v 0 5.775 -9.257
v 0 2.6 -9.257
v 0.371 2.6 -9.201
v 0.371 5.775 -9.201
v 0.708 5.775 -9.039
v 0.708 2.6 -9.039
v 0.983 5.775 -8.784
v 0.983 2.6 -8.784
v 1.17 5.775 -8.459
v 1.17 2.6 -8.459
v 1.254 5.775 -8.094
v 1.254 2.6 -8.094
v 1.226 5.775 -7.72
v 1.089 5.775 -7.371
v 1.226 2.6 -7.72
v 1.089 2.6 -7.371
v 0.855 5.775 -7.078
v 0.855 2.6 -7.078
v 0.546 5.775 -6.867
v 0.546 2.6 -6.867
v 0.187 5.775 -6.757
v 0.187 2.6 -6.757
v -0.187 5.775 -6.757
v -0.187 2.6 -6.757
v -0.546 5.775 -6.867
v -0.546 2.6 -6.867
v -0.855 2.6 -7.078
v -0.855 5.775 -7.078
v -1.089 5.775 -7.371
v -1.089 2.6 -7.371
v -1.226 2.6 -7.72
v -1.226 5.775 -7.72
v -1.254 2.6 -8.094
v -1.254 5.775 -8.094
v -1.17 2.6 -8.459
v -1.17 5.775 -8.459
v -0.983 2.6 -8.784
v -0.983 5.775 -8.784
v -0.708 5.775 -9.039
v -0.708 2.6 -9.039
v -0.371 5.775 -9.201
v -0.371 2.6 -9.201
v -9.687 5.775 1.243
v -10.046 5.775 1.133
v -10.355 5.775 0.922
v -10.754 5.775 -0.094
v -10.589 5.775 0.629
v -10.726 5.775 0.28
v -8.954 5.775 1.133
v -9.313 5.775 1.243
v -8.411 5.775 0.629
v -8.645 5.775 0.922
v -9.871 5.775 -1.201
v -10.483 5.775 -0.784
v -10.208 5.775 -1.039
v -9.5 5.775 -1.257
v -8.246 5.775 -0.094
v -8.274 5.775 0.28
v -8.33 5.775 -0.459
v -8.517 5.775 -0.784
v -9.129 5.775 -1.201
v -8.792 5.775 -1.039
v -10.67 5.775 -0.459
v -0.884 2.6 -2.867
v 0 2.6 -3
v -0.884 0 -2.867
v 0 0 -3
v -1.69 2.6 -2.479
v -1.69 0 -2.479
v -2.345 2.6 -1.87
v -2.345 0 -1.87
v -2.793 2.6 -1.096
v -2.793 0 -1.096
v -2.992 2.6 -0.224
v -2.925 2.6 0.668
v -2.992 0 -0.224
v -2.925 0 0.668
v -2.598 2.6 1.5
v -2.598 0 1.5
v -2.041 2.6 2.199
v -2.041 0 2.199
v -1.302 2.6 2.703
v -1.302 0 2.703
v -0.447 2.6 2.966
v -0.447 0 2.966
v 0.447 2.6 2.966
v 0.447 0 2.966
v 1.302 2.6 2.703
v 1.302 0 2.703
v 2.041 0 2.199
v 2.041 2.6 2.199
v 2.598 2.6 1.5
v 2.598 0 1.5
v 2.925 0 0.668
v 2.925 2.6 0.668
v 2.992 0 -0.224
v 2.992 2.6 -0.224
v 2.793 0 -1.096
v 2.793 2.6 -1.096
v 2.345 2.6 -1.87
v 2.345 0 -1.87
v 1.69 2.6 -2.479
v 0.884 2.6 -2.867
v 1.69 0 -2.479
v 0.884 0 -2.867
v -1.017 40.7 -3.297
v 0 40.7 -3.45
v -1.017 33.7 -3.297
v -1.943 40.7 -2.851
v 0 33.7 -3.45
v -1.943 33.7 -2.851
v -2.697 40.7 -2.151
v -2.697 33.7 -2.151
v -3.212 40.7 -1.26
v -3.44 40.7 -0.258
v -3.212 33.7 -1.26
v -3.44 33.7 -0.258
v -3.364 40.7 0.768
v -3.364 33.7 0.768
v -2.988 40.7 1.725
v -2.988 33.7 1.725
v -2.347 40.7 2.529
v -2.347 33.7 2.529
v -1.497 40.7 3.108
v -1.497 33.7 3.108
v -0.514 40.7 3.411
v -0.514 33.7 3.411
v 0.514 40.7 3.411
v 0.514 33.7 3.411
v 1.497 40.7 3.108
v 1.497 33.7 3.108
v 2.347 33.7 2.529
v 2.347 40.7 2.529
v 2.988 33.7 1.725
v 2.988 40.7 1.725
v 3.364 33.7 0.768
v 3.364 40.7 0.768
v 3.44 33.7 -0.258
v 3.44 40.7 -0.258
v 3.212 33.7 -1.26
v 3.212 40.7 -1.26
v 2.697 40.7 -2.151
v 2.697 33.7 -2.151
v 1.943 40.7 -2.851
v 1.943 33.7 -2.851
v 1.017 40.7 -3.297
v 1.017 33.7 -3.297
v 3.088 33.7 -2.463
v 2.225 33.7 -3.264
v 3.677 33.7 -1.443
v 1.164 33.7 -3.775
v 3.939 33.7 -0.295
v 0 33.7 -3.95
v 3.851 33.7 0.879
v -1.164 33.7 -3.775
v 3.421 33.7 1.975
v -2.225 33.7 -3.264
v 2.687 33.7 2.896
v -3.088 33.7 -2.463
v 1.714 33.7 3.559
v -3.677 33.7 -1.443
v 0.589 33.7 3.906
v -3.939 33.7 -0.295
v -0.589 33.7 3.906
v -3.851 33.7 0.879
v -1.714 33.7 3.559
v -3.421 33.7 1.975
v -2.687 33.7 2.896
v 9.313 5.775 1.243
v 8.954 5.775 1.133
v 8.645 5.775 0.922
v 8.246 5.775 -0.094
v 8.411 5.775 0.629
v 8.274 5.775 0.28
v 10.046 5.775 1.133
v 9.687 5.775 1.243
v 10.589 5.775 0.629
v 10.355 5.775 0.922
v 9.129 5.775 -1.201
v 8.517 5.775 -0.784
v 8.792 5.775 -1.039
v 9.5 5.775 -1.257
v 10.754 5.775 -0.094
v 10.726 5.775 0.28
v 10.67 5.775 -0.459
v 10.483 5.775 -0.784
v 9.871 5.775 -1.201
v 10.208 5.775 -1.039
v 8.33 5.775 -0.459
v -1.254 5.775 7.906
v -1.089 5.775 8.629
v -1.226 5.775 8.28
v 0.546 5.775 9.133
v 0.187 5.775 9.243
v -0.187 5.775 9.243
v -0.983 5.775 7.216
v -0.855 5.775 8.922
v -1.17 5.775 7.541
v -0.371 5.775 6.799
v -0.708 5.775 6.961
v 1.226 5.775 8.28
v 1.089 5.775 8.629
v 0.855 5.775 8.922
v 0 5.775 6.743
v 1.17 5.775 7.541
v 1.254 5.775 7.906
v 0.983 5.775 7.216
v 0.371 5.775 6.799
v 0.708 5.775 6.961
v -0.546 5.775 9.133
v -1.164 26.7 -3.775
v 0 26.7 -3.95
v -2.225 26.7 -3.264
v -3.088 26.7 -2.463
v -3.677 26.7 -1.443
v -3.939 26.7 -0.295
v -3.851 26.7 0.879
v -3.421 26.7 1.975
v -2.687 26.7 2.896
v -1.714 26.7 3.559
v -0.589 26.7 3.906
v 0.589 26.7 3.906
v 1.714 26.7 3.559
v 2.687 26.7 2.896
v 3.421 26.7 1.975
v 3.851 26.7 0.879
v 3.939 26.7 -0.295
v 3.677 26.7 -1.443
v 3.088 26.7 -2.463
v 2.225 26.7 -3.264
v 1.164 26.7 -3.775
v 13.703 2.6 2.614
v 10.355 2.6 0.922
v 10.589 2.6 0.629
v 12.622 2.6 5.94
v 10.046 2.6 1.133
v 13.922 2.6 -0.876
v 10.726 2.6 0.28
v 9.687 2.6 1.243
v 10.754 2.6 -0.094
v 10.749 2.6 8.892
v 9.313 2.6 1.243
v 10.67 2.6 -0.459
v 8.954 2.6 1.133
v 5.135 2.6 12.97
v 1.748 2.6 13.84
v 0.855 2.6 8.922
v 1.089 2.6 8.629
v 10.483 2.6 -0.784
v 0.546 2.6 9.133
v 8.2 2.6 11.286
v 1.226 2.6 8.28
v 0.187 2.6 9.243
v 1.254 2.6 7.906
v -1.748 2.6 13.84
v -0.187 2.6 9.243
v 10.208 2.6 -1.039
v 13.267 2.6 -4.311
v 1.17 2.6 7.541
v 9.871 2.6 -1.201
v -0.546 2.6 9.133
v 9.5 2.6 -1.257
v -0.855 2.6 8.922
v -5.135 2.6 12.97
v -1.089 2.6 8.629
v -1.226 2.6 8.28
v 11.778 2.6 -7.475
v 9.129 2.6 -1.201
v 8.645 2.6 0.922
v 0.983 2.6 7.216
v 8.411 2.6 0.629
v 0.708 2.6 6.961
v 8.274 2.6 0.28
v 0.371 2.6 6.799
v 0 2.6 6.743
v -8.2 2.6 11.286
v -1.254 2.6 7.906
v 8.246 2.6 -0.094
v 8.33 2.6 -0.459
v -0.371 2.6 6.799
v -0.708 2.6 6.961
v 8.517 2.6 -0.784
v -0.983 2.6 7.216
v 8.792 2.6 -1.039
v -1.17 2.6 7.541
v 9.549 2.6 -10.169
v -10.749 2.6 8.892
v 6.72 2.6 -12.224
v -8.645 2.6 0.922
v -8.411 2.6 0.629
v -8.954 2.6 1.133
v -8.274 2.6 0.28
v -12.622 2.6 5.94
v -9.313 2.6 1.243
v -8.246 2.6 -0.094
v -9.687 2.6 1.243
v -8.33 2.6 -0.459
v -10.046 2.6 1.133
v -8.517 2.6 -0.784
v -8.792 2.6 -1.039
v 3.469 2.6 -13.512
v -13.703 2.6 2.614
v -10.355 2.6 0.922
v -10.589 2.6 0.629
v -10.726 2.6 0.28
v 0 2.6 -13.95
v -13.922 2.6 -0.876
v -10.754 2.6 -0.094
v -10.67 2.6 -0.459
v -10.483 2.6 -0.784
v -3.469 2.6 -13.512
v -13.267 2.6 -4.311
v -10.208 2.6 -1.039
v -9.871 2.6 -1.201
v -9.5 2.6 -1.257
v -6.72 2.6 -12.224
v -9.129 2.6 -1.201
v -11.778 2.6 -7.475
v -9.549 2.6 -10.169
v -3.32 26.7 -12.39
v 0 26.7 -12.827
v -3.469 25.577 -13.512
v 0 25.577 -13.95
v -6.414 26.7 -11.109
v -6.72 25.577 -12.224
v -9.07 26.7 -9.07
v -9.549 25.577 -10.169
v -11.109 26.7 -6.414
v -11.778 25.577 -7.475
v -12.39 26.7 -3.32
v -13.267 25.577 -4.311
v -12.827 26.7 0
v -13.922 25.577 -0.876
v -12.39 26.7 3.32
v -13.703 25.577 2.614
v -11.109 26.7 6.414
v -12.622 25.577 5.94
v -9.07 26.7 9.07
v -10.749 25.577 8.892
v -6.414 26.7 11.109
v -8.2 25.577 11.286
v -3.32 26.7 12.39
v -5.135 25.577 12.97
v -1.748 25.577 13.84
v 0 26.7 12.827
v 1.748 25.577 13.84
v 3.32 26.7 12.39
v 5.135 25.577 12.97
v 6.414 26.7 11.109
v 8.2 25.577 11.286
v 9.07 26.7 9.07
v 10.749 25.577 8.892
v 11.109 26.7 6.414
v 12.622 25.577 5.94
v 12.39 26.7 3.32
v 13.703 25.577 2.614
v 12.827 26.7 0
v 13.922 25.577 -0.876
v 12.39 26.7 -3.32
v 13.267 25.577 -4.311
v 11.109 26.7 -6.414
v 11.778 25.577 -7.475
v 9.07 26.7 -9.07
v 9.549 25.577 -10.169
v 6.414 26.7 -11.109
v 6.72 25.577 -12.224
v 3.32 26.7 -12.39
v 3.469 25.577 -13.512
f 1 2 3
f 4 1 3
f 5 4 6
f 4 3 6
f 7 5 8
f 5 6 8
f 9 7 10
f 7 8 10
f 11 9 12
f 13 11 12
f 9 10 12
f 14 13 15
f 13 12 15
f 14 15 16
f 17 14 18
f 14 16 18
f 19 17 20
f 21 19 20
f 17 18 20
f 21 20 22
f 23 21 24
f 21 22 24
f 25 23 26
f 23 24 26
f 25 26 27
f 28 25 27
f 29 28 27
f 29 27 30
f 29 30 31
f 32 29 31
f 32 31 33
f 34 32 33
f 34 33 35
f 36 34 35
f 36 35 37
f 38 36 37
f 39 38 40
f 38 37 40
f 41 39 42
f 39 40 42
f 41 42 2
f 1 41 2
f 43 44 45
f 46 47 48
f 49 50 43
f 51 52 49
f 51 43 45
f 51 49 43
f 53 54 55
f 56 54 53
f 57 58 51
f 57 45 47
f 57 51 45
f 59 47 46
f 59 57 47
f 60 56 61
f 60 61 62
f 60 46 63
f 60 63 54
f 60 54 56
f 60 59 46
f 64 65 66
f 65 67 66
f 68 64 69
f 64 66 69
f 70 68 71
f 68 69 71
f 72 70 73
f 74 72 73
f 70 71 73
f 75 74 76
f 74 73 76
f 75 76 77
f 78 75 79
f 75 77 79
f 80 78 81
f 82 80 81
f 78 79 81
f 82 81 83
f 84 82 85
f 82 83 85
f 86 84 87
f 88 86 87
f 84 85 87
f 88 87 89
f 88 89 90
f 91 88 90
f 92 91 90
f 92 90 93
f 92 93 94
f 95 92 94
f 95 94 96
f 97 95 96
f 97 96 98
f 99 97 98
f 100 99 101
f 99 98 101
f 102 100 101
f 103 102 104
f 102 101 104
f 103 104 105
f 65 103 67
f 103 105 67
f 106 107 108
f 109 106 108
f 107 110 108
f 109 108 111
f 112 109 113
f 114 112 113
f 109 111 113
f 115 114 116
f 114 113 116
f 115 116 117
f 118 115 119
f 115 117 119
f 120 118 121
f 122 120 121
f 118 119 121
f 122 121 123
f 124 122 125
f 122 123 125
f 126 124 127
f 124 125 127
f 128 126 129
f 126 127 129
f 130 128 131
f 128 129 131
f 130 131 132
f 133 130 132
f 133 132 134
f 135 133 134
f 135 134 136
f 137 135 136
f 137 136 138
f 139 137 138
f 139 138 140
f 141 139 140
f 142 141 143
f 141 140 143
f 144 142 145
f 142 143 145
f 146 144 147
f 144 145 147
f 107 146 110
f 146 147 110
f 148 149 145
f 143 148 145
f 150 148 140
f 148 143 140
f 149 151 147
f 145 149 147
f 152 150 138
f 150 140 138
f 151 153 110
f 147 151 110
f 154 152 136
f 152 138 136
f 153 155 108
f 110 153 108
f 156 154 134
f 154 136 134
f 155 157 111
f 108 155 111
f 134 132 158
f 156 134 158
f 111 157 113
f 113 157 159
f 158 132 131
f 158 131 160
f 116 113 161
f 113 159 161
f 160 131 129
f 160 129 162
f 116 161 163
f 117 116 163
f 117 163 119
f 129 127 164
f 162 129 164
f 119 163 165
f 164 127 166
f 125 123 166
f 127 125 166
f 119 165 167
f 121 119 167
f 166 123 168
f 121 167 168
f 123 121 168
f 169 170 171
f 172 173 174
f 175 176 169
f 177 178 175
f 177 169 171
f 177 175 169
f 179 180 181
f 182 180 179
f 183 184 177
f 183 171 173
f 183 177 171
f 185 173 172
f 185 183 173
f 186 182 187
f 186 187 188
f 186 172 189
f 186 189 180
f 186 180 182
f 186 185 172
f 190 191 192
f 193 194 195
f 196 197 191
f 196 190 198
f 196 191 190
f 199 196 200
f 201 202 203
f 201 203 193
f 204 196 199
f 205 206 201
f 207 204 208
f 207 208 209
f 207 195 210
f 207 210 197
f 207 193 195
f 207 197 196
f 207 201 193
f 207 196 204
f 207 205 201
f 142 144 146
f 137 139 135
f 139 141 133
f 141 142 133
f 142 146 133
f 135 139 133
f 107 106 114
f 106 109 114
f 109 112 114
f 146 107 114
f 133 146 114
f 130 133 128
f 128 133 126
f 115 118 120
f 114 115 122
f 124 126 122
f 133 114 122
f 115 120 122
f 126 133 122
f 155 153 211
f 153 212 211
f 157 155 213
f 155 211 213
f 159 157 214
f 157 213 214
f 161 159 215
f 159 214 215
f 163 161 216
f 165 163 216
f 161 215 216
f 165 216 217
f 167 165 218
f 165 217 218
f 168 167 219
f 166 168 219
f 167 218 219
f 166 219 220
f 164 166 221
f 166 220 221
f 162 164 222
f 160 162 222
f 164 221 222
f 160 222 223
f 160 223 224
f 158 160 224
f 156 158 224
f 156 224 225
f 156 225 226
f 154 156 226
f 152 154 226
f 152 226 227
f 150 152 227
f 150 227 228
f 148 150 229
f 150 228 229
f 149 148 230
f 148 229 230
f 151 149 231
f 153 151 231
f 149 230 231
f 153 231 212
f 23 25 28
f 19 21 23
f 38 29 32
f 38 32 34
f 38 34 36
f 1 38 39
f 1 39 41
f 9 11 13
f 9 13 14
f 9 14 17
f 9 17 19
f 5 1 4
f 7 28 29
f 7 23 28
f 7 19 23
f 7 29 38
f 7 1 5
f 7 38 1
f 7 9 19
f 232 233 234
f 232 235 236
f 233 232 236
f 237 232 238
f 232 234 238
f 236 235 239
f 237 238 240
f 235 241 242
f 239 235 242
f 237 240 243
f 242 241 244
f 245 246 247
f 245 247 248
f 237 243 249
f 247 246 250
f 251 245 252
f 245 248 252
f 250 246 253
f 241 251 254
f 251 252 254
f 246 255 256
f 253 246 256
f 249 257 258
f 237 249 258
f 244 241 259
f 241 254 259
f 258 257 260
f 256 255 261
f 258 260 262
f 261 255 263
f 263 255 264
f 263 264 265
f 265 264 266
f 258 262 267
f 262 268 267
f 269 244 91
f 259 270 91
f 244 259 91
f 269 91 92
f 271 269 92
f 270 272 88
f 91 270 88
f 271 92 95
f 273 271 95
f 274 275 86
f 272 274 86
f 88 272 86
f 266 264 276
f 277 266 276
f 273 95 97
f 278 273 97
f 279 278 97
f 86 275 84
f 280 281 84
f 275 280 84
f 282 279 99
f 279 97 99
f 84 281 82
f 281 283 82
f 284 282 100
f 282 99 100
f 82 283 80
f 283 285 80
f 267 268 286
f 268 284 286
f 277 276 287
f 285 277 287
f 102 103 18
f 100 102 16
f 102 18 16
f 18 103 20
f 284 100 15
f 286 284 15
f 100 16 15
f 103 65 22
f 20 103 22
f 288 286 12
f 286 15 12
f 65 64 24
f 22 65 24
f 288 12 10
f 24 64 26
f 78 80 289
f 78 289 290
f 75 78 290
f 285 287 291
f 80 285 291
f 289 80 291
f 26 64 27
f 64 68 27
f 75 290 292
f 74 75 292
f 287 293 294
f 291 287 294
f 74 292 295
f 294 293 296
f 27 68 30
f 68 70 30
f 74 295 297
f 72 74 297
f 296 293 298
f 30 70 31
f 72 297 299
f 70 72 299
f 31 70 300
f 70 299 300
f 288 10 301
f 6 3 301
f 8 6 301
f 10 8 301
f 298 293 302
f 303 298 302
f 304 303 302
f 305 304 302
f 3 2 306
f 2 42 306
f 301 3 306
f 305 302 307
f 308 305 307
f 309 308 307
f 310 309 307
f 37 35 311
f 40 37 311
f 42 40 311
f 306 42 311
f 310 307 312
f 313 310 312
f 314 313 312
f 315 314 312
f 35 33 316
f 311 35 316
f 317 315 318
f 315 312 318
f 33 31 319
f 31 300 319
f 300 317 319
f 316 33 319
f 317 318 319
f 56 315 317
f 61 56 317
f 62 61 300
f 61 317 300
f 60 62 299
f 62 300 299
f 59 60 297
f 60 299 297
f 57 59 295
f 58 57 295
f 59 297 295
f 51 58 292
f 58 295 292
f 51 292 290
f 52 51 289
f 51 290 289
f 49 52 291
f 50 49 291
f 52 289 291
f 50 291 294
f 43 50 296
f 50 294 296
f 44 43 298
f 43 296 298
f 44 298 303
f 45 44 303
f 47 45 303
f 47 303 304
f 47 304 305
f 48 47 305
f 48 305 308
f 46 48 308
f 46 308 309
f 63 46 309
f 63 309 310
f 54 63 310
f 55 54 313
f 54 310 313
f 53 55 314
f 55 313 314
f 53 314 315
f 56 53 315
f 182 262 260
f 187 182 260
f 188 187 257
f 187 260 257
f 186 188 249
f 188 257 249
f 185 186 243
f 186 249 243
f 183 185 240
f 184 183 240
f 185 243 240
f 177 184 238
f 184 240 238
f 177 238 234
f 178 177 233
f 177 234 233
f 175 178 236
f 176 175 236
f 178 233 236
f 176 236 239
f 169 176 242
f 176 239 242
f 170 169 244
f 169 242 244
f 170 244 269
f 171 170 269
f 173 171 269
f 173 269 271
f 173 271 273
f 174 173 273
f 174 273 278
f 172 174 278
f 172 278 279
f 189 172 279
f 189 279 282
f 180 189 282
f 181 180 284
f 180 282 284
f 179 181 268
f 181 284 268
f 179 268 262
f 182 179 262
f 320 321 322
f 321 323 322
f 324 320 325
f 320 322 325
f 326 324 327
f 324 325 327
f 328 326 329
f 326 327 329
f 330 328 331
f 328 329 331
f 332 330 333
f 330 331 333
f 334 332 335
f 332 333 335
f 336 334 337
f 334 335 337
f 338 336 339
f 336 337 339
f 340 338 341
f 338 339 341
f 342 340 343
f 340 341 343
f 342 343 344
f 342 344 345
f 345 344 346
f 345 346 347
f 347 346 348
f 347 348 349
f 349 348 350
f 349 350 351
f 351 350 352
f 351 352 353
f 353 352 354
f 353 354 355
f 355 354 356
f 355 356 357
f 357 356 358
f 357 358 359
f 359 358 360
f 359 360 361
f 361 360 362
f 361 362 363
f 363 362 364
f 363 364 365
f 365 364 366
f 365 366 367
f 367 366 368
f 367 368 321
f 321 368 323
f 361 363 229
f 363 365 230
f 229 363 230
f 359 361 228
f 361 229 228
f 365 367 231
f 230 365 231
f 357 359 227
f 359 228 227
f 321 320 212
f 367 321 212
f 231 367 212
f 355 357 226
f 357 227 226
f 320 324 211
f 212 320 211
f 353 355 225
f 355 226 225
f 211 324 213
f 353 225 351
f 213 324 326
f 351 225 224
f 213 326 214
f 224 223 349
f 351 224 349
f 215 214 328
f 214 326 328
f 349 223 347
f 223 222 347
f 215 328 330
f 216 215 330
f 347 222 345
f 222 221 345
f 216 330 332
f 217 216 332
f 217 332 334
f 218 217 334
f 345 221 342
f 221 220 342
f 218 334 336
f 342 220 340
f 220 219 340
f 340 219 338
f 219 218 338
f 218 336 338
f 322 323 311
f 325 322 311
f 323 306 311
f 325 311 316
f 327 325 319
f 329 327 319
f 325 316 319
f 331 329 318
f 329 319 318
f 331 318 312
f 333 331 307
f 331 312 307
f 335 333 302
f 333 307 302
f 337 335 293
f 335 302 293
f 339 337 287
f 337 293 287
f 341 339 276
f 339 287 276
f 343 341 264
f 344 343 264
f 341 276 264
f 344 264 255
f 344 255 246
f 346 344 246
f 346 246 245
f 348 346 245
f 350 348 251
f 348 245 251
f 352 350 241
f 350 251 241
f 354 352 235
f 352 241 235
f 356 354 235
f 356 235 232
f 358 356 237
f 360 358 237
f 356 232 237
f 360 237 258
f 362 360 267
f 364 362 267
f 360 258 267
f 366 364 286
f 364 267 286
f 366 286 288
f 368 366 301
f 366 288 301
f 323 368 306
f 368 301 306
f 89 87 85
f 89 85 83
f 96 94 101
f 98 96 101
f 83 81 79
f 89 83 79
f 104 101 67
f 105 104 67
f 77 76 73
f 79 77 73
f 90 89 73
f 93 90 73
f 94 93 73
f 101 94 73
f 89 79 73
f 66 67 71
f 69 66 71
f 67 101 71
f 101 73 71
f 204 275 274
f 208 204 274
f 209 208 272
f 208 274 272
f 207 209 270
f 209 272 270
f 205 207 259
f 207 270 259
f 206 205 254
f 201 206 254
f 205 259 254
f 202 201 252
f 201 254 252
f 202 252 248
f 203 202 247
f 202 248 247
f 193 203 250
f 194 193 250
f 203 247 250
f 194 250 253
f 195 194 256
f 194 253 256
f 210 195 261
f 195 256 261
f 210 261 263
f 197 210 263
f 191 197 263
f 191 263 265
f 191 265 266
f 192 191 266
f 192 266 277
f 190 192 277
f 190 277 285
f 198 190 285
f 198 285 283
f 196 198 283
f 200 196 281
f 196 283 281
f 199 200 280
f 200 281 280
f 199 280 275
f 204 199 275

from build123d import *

# Parameters (mm, degrees)
SKETCH2_R          = 1.2573
CUT_EXTRUDE1_DEPTH = 3.175


with BuildPart() as part:
    # Sketch1 → Revolve1 (revolve)
    with BuildSketch(Plane.XY, mode=Mode.PRIVATE) as revolve1_sk:
        Polygon((0, 40.7), (3.45, 40.7), (3.45, 33.7), (3.95, 33.7), (3.95, 26.7), (12.827467985, 26.7), (13.95, 25.577467985), (13.95, 2.6), (3, 2.6), (3, 0), (0, 0), align=None)
    revolve(revolve1_sk.sketch.rotate(Axis((0, 0, 0), (0, 1, 0)), 90), axis=Axis((0, 0, 0), (0, 1, 0)))

    # Sketch2 → Cut-Extrude1 (cut)
    with BuildSketch(Plane.XZ.offset(-2.6)):
        with Locations(Location((-9.5, 0, 0), (0, 0, 270))):
            Circle(SKETCH2_R)
        with Locations(Location((0, -8, 0), (0, 0, 270))):
            Circle(SKETCH2_R)
        with Locations(Location((9.5, 0, 0), (0, 0, 270))):
            Circle(SKETCH2_R)
        with Locations(Location((0, 8, 0), (0, 0, 270))):
            Circle(SKETCH2_R)
    extrude(amount=-CUT_EXTRUDE1_DEPTH, mode=Mode.SUBTRACT)


solid = part.part
